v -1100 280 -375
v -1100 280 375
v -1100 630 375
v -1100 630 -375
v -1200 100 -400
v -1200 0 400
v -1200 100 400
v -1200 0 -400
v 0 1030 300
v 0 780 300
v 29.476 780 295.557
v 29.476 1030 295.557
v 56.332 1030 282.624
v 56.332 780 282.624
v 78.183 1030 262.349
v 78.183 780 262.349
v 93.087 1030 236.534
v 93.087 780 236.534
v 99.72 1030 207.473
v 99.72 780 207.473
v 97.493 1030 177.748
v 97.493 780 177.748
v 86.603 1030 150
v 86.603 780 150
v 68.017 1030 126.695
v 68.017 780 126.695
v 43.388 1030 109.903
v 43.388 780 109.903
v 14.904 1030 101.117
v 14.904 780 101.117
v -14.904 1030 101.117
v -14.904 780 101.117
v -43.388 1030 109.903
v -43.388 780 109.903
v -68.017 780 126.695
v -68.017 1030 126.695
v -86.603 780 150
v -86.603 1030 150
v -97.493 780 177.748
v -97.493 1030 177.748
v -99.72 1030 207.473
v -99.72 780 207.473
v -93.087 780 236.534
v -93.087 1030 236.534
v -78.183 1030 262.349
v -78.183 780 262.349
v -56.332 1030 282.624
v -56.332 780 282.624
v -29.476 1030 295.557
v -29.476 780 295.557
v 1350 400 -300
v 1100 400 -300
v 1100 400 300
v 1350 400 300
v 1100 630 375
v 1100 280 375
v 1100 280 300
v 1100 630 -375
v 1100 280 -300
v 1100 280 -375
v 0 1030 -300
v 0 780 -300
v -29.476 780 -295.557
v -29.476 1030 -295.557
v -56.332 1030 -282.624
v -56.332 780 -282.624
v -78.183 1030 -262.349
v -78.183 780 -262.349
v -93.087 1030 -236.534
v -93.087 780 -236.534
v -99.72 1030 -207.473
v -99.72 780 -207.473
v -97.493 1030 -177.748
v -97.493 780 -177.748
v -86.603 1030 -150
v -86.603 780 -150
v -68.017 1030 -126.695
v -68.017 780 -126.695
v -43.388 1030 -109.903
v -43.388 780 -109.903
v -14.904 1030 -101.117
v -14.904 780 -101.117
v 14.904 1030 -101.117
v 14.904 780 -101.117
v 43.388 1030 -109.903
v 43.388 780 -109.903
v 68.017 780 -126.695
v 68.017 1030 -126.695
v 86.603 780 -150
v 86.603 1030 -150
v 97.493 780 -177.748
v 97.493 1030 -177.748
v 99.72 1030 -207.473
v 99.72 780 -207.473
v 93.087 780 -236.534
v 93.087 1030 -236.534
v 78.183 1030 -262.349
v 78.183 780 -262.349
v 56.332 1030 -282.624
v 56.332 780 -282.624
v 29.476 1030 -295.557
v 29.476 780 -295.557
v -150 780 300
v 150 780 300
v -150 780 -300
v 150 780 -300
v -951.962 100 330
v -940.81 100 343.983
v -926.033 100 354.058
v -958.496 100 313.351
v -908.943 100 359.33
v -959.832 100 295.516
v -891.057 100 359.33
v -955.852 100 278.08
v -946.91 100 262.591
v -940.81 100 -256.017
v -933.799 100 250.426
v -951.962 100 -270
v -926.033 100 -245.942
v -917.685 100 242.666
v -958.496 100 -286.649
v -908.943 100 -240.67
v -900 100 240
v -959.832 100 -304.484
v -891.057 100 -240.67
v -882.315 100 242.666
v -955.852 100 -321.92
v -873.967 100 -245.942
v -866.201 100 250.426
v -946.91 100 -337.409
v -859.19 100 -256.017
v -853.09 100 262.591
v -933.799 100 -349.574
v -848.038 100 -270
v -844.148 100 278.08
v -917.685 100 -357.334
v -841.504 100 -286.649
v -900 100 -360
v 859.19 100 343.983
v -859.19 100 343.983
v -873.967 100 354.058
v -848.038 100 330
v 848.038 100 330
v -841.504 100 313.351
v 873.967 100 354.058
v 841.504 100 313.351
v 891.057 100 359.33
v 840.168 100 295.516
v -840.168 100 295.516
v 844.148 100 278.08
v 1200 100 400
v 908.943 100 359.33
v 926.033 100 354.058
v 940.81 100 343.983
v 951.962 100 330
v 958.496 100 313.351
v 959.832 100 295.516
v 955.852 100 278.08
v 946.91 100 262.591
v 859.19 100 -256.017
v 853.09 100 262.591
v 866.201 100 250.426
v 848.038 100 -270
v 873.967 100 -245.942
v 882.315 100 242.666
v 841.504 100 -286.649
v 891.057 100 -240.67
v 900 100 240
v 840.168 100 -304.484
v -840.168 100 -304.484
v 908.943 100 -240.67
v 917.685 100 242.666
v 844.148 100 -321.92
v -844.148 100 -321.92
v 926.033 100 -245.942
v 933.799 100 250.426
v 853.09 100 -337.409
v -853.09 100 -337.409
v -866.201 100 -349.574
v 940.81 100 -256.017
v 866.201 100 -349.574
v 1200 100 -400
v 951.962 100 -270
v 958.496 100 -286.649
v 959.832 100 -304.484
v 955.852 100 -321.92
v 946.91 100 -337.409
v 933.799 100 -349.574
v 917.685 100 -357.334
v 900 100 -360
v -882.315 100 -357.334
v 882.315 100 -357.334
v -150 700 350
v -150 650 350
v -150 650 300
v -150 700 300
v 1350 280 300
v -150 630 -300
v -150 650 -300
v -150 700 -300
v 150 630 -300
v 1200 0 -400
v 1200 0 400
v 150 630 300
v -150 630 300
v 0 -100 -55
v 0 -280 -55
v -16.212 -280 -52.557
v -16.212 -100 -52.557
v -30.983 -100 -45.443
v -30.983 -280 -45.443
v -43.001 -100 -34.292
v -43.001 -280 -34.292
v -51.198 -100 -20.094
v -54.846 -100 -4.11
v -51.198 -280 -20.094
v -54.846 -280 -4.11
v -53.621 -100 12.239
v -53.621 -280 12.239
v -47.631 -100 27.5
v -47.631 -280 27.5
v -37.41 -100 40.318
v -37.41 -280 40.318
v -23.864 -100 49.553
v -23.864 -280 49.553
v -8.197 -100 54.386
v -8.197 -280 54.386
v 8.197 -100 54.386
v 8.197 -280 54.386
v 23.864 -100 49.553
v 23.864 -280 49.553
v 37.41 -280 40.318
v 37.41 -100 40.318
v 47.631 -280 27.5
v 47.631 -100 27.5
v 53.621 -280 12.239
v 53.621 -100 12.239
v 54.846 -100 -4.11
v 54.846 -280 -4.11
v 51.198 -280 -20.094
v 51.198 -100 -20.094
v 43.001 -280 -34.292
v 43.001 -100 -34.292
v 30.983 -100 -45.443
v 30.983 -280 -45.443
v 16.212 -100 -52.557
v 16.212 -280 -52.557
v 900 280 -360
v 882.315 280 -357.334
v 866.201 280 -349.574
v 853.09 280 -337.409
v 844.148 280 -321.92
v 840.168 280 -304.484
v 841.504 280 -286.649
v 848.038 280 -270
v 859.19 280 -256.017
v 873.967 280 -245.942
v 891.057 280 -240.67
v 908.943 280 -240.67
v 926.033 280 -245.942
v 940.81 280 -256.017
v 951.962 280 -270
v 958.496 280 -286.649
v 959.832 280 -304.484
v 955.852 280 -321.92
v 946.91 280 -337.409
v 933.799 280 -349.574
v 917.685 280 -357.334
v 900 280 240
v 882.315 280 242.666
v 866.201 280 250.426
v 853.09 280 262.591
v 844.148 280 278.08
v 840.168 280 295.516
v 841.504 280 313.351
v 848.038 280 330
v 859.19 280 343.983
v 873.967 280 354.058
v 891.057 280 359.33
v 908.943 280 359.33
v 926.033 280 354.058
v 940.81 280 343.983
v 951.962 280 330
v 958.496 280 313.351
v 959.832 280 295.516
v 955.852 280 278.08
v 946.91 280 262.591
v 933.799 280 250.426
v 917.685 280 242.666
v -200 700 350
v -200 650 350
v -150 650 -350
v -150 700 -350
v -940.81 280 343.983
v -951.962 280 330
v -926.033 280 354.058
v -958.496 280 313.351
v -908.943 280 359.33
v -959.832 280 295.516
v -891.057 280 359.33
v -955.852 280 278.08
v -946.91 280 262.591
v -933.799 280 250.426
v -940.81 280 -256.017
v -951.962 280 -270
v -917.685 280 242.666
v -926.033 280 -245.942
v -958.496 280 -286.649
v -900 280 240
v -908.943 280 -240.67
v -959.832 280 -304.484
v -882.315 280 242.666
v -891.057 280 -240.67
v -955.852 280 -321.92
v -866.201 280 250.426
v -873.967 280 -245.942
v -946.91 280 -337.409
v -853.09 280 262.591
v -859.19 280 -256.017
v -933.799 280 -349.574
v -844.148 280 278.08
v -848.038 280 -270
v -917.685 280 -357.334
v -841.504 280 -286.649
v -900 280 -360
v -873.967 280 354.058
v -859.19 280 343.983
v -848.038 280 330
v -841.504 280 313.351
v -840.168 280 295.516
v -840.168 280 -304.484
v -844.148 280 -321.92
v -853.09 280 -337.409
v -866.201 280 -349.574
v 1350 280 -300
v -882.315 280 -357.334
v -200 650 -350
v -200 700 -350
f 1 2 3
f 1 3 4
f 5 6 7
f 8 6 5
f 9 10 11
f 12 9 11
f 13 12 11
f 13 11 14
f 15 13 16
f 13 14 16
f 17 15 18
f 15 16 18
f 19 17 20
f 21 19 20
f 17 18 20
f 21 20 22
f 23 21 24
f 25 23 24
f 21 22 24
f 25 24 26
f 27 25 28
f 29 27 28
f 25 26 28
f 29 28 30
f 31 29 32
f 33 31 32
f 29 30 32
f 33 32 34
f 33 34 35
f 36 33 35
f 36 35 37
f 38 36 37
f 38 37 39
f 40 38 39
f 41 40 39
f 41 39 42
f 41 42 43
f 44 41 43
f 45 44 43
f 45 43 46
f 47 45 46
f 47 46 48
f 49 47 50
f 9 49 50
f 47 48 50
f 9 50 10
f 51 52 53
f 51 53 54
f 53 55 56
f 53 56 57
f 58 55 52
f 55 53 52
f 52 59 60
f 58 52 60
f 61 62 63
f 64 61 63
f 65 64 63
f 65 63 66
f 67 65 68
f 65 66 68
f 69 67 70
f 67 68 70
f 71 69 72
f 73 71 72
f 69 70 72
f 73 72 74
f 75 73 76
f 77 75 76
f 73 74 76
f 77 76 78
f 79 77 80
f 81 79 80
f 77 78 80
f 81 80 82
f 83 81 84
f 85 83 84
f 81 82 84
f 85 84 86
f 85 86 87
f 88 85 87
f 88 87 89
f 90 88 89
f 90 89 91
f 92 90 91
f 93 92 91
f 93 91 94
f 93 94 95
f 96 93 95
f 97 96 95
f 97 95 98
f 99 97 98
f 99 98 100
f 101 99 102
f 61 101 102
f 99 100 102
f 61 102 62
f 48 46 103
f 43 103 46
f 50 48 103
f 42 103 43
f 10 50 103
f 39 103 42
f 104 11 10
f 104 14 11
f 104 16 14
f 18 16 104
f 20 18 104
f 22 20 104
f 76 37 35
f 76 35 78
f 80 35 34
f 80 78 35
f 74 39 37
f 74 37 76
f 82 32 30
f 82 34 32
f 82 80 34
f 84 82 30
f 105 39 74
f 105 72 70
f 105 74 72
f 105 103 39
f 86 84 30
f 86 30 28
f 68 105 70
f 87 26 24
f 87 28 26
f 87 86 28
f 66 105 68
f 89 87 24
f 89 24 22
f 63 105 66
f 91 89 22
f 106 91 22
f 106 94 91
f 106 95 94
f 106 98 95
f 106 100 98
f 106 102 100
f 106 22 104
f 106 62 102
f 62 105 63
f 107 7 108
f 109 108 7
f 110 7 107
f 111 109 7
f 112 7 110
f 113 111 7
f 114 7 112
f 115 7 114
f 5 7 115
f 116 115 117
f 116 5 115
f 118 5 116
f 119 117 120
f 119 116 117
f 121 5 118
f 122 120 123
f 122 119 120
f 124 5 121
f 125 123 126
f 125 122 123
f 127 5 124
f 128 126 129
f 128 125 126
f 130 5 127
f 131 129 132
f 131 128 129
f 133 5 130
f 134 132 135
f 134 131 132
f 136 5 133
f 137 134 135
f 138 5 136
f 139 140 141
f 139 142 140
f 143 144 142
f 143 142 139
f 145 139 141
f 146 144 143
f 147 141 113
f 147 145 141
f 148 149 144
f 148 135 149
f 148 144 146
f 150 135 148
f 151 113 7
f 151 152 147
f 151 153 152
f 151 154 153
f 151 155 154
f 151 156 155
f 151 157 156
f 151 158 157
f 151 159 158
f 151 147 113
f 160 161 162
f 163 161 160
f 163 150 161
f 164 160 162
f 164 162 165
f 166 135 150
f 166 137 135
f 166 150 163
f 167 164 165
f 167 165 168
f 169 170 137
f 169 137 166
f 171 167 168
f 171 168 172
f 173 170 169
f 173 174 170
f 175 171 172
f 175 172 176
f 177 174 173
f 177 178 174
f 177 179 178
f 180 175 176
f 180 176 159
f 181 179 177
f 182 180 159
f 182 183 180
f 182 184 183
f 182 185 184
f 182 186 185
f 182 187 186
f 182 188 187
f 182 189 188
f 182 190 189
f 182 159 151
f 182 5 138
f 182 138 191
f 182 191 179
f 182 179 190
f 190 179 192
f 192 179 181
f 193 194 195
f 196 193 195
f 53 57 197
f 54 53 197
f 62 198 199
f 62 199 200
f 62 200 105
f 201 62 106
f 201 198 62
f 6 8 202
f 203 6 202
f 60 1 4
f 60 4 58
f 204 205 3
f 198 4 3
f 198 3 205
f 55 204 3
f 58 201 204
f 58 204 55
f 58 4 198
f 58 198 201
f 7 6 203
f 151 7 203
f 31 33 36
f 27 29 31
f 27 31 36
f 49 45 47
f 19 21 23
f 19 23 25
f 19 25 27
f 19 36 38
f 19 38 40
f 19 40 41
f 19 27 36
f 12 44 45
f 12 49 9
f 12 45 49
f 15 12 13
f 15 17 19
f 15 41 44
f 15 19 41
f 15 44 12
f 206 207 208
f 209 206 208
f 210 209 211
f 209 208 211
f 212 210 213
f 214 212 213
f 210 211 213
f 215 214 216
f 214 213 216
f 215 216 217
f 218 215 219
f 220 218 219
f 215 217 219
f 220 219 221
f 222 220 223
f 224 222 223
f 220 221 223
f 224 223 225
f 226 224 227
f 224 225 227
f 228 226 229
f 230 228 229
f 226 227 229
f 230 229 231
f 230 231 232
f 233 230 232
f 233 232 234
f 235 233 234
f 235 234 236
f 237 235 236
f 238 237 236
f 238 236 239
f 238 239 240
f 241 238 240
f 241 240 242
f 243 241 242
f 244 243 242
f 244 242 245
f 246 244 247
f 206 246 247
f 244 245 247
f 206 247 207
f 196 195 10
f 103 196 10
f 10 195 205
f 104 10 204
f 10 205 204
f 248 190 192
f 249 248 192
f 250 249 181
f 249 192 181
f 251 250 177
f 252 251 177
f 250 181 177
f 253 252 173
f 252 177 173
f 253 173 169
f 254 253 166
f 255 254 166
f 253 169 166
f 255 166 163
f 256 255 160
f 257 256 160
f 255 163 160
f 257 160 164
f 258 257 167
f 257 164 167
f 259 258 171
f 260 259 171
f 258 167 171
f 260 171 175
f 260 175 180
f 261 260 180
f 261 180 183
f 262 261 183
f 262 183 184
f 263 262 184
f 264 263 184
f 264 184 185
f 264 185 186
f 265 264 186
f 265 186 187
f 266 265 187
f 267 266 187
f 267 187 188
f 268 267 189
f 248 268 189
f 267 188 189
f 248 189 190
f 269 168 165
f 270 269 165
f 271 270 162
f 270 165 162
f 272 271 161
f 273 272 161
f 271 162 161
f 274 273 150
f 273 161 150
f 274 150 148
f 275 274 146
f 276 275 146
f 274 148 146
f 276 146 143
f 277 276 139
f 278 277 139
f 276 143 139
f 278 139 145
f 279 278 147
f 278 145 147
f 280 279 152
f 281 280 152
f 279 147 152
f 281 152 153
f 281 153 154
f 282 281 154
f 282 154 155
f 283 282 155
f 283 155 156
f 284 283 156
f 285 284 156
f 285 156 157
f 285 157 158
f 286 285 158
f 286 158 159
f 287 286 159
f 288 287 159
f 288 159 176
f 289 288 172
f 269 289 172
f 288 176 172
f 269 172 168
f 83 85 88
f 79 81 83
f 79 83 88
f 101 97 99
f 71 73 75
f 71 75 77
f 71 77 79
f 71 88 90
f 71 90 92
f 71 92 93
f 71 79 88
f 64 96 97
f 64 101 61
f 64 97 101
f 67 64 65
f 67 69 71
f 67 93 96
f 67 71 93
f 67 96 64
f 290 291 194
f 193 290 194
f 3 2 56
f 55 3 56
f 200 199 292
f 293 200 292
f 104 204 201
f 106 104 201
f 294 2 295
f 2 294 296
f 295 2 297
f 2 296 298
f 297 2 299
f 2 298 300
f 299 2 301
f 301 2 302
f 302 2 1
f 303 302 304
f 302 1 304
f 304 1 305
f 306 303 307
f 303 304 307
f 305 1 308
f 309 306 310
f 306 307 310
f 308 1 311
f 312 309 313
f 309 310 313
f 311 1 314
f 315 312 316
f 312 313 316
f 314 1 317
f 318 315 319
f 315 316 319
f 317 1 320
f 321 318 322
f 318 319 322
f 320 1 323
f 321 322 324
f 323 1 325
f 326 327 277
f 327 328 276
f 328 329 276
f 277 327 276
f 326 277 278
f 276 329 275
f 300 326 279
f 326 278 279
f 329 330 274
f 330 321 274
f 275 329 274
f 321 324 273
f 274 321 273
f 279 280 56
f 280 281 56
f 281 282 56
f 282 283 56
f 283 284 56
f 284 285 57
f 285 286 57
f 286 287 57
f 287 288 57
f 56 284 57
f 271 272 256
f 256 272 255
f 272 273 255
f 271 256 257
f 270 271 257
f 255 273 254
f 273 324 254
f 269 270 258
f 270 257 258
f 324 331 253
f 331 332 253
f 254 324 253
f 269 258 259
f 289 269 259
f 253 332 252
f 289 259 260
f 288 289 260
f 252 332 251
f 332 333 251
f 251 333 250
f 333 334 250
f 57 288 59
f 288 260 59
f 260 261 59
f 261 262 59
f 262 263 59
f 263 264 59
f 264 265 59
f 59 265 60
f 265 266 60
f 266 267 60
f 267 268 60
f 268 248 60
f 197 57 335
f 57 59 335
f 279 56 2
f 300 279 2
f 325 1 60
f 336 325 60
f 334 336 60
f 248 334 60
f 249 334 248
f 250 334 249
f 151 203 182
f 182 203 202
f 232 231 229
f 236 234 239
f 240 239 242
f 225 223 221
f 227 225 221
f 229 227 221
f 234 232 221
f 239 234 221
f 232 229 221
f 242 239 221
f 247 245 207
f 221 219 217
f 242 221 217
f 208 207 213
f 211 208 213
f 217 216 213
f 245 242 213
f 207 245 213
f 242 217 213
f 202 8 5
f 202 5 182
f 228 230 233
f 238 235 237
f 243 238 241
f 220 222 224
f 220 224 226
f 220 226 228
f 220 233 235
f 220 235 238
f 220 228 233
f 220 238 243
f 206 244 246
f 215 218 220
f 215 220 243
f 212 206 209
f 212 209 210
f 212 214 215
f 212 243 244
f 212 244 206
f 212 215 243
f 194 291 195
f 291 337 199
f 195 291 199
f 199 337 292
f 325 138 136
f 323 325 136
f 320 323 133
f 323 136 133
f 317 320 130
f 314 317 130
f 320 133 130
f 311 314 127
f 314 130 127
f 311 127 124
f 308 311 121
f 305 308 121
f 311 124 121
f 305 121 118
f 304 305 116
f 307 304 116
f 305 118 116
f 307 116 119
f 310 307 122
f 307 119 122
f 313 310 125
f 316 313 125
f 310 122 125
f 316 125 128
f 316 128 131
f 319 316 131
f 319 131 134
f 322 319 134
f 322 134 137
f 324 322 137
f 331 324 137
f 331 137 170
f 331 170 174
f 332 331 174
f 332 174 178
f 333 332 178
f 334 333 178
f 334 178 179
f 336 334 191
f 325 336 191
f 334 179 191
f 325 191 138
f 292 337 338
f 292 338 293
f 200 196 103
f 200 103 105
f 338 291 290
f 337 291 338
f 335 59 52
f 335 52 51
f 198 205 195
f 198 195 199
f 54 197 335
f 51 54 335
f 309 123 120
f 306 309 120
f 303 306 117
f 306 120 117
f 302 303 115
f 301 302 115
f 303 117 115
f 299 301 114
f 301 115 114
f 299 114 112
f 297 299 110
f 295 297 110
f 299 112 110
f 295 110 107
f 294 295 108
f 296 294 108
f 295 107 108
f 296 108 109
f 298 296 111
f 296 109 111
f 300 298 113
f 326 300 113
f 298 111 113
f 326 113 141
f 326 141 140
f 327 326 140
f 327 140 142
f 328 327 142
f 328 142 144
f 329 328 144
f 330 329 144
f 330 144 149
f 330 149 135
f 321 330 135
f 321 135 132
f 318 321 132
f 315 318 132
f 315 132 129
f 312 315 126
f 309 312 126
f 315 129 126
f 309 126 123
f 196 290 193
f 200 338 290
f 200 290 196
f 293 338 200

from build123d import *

# Parameters (mm, degrees)
SKETCH1_W            = 2400
SKETCH1_H            = 800
BOSS_EXTRUDE1_DEPTH  = 100
BOSS_EXTRUDE2_START  = 100
SKETCH2_R            = 60
BOSS_EXTRUDE2_DEPTH  = 180
BOSS_EXTRUDE3_START  = 100
SKETCH3_R            = 60
BOSS_EXTRUDE3_DEPTH  = 180
BOSS_EXTRUDE4_START  = 100
SKETCH4_R            = 60
BOSS_EXTRUDE4_DEPTH  = 180
BOSS_EXTRUDE5_START  = 100
SKETCH5_R            = 60
BOSS_EXTRUDE5_DEPTH  = 180
BOSS_EXTRUDE6_START  = 280
SKETCH6_W            = 2200
SKETCH6_H            = 750
BOSS_EXTRUDE6_DEPTH  = 350
BOSS_EXTRUDE7_START  = 280
SKETCH7_W            = 250
SKETCH7_H            = 600
BOSS_EXTRUDE7_DEPTH  = 120
BOSS_EXTRUDE8_START  = 650
SKETCH8_W            = 50
SKETCH8_H            = 700
BOSS_EXTRUDE8_DEPTH  = 50
BOSS_EXTRUDE9_START  = 630
SKETCH9_W            = 300
SKETCH9_H            = 600
BOSS_EXTRUDE9_DEPTH  = 150
BOSS_EXTRUDE10_START = 780
SKETCH10_R           = 100
BOSS_EXTRUDE10_DEPTH = 250
BOSS_EXTRUDE11_START = 780
SKETCH11_R           = 100
BOSS_EXTRUDE11_DEPTH = 250
BOSS_EXTRUDE12_START = -280
SKETCH12_R           = 55
BOSS_EXTRUDE12_DEPTH = 180


with BuildPart() as part:
    # Sketch1 → Boss-Extrude1 (new body)
    with BuildSketch(Plane(origin=(0, 0, 0), x_dir=(1, 0, 0), z_dir=(0, 1, 0))):
        Rectangle(SKETCH1_W, SKETCH1_H)
    extrude(amount=BOSS_EXTRUDE1_DEPTH)

    # Sketch2 → Boss-Extrude2 (add)
    with BuildSketch(Plane(origin=(0, 0, 0), x_dir=(1, 0, 0), z_dir=(0, 1, 0)).offset(BOSS_EXTRUDE2_START)):
        with Locations(Location((-900, -300, 0), (0, 0, 90))):
            Circle(SKETCH2_R)
    extrude(amount=BOSS_EXTRUDE2_DEPTH)

    # Sketch3 → Boss-Extrude3 (add)
    with BuildSketch(Plane(origin=(0, 0, 0), x_dir=(1, 0, 0), z_dir=(0, 1, 0)).offset(BOSS_EXTRUDE3_START)):
        with Locations(Location((-900, 300, 0), (0, 0, 90))):
            Circle(SKETCH3_R)
    extrude(amount=BOSS_EXTRUDE3_DEPTH)

    # Sketch4 → Boss-Extrude4 (add)
    with BuildSketch(Plane(origin=(0, 0, 0), x_dir=(1, 0, 0), z_dir=(0, 1, 0)).offset(BOSS_EXTRUDE4_START)):
        with Locations(Location((900, -300, 0), (0, 0, 90))):
            Circle(SKETCH4_R)
    extrude(amount=BOSS_EXTRUDE4_DEPTH)

    # Sketch5 → Boss-Extrude5 (add)
    with BuildSketch(Plane(origin=(0, 0, 0), x_dir=(1, 0, 0), z_dir=(0, 1, 0)).offset(BOSS_EXTRUDE5_START)):
        with Locations(Location((900, 300, 0), (0, 0, 90))):
            Circle(SKETCH5_R)
    extrude(amount=BOSS_EXTRUDE5_DEPTH)

    # Sketch6 → Boss-Extrude6 (add)
    with BuildSketch(Plane(origin=(0, 0, 0), x_dir=(1, 0, 0), z_dir=(0, 1, 0)).offset(BOSS_EXTRUDE6_START)):
        Rectangle(SKETCH6_W, SKETCH6_H)
    extrude(amount=BOSS_EXTRUDE6_DEPTH)

    # Sketch7 → Boss-Extrude7 (add)
    with BuildSketch(Plane(origin=(0, 0, 0), x_dir=(1, 0, 0), z_dir=(0, 1, 0)).offset(BOSS_EXTRUDE7_START)):
        with Locations((1225, 0)):
            Rectangle(SKETCH7_W, SKETCH7_H)
    extrude(amount=BOSS_EXTRUDE7_DEPTH)



with BuildPart() as body_2:
    # Sketch8 → Boss-Extrude8 (new body)
    with BuildSketch(Plane(origin=(0, 0, 0), x_dir=(1, 0, 0), z_dir=(0, 1, 0)).offset(BOSS_EXTRUDE8_START)):
        with Locations((-175, 0)):
            Rectangle(SKETCH8_W, SKETCH8_H)
    extrude(amount=BOSS_EXTRUDE8_DEPTH)


with BuildPart() as part_1:
    add(part.part)

    add(body_2.part)  # Boss-Extrude9 merges body 2
    # Sketch9 → Boss-Extrude9 (add)
    with BuildSketch(Plane(origin=(0, 0, 0), x_dir=(1, 0, 0), z_dir=(0, 1, 0)).offset(BOSS_EXTRUDE9_START)):
        Rectangle(SKETCH9_W, SKETCH9_H)
    extrude(amount=BOSS_EXTRUDE9_DEPTH)

    # Sketch10 → Boss-Extrude10 (add)
    with BuildSketch(Plane(origin=(0, 0, 0), x_dir=(1, 0, 0), z_dir=(0, 1, 0)).offset(BOSS_EXTRUDE10_START)):
        with Locations(Location((0, -200, 0), (0, 0, 270))):
            Circle(SKETCH10_R)
    extrude(amount=BOSS_EXTRUDE10_DEPTH)

    # Sketch11 → Boss-Extrude11 (add)
    with BuildSketch(Plane(origin=(0, 0, 0), x_dir=(1, 0, 0), z_dir=(0, 1, 0)).offset(BOSS_EXTRUDE11_START)):
        with Locations(Location((0, 200, 0), (0, 0, 90))):
            Circle(SKETCH11_R)
    extrude(amount=BOSS_EXTRUDE11_DEPTH)


with BuildPart() as body_2_2:
    # Sketch12 → Boss-Extrude12 (new body)
    with BuildSketch(Plane(origin=(0, 0, 0), x_dir=(1, 0, 0), z_dir=(0, 1, 0)).offset(BOSS_EXTRUDE12_START)):
        with Locations(Location((0, 0, 0), (0, 0, 90))):
            Circle(SKETCH12_R)
    extrude(amount=BOSS_EXTRUDE12_DEPTH)


solid = Compound([part_1.part, body_2_2.part])
